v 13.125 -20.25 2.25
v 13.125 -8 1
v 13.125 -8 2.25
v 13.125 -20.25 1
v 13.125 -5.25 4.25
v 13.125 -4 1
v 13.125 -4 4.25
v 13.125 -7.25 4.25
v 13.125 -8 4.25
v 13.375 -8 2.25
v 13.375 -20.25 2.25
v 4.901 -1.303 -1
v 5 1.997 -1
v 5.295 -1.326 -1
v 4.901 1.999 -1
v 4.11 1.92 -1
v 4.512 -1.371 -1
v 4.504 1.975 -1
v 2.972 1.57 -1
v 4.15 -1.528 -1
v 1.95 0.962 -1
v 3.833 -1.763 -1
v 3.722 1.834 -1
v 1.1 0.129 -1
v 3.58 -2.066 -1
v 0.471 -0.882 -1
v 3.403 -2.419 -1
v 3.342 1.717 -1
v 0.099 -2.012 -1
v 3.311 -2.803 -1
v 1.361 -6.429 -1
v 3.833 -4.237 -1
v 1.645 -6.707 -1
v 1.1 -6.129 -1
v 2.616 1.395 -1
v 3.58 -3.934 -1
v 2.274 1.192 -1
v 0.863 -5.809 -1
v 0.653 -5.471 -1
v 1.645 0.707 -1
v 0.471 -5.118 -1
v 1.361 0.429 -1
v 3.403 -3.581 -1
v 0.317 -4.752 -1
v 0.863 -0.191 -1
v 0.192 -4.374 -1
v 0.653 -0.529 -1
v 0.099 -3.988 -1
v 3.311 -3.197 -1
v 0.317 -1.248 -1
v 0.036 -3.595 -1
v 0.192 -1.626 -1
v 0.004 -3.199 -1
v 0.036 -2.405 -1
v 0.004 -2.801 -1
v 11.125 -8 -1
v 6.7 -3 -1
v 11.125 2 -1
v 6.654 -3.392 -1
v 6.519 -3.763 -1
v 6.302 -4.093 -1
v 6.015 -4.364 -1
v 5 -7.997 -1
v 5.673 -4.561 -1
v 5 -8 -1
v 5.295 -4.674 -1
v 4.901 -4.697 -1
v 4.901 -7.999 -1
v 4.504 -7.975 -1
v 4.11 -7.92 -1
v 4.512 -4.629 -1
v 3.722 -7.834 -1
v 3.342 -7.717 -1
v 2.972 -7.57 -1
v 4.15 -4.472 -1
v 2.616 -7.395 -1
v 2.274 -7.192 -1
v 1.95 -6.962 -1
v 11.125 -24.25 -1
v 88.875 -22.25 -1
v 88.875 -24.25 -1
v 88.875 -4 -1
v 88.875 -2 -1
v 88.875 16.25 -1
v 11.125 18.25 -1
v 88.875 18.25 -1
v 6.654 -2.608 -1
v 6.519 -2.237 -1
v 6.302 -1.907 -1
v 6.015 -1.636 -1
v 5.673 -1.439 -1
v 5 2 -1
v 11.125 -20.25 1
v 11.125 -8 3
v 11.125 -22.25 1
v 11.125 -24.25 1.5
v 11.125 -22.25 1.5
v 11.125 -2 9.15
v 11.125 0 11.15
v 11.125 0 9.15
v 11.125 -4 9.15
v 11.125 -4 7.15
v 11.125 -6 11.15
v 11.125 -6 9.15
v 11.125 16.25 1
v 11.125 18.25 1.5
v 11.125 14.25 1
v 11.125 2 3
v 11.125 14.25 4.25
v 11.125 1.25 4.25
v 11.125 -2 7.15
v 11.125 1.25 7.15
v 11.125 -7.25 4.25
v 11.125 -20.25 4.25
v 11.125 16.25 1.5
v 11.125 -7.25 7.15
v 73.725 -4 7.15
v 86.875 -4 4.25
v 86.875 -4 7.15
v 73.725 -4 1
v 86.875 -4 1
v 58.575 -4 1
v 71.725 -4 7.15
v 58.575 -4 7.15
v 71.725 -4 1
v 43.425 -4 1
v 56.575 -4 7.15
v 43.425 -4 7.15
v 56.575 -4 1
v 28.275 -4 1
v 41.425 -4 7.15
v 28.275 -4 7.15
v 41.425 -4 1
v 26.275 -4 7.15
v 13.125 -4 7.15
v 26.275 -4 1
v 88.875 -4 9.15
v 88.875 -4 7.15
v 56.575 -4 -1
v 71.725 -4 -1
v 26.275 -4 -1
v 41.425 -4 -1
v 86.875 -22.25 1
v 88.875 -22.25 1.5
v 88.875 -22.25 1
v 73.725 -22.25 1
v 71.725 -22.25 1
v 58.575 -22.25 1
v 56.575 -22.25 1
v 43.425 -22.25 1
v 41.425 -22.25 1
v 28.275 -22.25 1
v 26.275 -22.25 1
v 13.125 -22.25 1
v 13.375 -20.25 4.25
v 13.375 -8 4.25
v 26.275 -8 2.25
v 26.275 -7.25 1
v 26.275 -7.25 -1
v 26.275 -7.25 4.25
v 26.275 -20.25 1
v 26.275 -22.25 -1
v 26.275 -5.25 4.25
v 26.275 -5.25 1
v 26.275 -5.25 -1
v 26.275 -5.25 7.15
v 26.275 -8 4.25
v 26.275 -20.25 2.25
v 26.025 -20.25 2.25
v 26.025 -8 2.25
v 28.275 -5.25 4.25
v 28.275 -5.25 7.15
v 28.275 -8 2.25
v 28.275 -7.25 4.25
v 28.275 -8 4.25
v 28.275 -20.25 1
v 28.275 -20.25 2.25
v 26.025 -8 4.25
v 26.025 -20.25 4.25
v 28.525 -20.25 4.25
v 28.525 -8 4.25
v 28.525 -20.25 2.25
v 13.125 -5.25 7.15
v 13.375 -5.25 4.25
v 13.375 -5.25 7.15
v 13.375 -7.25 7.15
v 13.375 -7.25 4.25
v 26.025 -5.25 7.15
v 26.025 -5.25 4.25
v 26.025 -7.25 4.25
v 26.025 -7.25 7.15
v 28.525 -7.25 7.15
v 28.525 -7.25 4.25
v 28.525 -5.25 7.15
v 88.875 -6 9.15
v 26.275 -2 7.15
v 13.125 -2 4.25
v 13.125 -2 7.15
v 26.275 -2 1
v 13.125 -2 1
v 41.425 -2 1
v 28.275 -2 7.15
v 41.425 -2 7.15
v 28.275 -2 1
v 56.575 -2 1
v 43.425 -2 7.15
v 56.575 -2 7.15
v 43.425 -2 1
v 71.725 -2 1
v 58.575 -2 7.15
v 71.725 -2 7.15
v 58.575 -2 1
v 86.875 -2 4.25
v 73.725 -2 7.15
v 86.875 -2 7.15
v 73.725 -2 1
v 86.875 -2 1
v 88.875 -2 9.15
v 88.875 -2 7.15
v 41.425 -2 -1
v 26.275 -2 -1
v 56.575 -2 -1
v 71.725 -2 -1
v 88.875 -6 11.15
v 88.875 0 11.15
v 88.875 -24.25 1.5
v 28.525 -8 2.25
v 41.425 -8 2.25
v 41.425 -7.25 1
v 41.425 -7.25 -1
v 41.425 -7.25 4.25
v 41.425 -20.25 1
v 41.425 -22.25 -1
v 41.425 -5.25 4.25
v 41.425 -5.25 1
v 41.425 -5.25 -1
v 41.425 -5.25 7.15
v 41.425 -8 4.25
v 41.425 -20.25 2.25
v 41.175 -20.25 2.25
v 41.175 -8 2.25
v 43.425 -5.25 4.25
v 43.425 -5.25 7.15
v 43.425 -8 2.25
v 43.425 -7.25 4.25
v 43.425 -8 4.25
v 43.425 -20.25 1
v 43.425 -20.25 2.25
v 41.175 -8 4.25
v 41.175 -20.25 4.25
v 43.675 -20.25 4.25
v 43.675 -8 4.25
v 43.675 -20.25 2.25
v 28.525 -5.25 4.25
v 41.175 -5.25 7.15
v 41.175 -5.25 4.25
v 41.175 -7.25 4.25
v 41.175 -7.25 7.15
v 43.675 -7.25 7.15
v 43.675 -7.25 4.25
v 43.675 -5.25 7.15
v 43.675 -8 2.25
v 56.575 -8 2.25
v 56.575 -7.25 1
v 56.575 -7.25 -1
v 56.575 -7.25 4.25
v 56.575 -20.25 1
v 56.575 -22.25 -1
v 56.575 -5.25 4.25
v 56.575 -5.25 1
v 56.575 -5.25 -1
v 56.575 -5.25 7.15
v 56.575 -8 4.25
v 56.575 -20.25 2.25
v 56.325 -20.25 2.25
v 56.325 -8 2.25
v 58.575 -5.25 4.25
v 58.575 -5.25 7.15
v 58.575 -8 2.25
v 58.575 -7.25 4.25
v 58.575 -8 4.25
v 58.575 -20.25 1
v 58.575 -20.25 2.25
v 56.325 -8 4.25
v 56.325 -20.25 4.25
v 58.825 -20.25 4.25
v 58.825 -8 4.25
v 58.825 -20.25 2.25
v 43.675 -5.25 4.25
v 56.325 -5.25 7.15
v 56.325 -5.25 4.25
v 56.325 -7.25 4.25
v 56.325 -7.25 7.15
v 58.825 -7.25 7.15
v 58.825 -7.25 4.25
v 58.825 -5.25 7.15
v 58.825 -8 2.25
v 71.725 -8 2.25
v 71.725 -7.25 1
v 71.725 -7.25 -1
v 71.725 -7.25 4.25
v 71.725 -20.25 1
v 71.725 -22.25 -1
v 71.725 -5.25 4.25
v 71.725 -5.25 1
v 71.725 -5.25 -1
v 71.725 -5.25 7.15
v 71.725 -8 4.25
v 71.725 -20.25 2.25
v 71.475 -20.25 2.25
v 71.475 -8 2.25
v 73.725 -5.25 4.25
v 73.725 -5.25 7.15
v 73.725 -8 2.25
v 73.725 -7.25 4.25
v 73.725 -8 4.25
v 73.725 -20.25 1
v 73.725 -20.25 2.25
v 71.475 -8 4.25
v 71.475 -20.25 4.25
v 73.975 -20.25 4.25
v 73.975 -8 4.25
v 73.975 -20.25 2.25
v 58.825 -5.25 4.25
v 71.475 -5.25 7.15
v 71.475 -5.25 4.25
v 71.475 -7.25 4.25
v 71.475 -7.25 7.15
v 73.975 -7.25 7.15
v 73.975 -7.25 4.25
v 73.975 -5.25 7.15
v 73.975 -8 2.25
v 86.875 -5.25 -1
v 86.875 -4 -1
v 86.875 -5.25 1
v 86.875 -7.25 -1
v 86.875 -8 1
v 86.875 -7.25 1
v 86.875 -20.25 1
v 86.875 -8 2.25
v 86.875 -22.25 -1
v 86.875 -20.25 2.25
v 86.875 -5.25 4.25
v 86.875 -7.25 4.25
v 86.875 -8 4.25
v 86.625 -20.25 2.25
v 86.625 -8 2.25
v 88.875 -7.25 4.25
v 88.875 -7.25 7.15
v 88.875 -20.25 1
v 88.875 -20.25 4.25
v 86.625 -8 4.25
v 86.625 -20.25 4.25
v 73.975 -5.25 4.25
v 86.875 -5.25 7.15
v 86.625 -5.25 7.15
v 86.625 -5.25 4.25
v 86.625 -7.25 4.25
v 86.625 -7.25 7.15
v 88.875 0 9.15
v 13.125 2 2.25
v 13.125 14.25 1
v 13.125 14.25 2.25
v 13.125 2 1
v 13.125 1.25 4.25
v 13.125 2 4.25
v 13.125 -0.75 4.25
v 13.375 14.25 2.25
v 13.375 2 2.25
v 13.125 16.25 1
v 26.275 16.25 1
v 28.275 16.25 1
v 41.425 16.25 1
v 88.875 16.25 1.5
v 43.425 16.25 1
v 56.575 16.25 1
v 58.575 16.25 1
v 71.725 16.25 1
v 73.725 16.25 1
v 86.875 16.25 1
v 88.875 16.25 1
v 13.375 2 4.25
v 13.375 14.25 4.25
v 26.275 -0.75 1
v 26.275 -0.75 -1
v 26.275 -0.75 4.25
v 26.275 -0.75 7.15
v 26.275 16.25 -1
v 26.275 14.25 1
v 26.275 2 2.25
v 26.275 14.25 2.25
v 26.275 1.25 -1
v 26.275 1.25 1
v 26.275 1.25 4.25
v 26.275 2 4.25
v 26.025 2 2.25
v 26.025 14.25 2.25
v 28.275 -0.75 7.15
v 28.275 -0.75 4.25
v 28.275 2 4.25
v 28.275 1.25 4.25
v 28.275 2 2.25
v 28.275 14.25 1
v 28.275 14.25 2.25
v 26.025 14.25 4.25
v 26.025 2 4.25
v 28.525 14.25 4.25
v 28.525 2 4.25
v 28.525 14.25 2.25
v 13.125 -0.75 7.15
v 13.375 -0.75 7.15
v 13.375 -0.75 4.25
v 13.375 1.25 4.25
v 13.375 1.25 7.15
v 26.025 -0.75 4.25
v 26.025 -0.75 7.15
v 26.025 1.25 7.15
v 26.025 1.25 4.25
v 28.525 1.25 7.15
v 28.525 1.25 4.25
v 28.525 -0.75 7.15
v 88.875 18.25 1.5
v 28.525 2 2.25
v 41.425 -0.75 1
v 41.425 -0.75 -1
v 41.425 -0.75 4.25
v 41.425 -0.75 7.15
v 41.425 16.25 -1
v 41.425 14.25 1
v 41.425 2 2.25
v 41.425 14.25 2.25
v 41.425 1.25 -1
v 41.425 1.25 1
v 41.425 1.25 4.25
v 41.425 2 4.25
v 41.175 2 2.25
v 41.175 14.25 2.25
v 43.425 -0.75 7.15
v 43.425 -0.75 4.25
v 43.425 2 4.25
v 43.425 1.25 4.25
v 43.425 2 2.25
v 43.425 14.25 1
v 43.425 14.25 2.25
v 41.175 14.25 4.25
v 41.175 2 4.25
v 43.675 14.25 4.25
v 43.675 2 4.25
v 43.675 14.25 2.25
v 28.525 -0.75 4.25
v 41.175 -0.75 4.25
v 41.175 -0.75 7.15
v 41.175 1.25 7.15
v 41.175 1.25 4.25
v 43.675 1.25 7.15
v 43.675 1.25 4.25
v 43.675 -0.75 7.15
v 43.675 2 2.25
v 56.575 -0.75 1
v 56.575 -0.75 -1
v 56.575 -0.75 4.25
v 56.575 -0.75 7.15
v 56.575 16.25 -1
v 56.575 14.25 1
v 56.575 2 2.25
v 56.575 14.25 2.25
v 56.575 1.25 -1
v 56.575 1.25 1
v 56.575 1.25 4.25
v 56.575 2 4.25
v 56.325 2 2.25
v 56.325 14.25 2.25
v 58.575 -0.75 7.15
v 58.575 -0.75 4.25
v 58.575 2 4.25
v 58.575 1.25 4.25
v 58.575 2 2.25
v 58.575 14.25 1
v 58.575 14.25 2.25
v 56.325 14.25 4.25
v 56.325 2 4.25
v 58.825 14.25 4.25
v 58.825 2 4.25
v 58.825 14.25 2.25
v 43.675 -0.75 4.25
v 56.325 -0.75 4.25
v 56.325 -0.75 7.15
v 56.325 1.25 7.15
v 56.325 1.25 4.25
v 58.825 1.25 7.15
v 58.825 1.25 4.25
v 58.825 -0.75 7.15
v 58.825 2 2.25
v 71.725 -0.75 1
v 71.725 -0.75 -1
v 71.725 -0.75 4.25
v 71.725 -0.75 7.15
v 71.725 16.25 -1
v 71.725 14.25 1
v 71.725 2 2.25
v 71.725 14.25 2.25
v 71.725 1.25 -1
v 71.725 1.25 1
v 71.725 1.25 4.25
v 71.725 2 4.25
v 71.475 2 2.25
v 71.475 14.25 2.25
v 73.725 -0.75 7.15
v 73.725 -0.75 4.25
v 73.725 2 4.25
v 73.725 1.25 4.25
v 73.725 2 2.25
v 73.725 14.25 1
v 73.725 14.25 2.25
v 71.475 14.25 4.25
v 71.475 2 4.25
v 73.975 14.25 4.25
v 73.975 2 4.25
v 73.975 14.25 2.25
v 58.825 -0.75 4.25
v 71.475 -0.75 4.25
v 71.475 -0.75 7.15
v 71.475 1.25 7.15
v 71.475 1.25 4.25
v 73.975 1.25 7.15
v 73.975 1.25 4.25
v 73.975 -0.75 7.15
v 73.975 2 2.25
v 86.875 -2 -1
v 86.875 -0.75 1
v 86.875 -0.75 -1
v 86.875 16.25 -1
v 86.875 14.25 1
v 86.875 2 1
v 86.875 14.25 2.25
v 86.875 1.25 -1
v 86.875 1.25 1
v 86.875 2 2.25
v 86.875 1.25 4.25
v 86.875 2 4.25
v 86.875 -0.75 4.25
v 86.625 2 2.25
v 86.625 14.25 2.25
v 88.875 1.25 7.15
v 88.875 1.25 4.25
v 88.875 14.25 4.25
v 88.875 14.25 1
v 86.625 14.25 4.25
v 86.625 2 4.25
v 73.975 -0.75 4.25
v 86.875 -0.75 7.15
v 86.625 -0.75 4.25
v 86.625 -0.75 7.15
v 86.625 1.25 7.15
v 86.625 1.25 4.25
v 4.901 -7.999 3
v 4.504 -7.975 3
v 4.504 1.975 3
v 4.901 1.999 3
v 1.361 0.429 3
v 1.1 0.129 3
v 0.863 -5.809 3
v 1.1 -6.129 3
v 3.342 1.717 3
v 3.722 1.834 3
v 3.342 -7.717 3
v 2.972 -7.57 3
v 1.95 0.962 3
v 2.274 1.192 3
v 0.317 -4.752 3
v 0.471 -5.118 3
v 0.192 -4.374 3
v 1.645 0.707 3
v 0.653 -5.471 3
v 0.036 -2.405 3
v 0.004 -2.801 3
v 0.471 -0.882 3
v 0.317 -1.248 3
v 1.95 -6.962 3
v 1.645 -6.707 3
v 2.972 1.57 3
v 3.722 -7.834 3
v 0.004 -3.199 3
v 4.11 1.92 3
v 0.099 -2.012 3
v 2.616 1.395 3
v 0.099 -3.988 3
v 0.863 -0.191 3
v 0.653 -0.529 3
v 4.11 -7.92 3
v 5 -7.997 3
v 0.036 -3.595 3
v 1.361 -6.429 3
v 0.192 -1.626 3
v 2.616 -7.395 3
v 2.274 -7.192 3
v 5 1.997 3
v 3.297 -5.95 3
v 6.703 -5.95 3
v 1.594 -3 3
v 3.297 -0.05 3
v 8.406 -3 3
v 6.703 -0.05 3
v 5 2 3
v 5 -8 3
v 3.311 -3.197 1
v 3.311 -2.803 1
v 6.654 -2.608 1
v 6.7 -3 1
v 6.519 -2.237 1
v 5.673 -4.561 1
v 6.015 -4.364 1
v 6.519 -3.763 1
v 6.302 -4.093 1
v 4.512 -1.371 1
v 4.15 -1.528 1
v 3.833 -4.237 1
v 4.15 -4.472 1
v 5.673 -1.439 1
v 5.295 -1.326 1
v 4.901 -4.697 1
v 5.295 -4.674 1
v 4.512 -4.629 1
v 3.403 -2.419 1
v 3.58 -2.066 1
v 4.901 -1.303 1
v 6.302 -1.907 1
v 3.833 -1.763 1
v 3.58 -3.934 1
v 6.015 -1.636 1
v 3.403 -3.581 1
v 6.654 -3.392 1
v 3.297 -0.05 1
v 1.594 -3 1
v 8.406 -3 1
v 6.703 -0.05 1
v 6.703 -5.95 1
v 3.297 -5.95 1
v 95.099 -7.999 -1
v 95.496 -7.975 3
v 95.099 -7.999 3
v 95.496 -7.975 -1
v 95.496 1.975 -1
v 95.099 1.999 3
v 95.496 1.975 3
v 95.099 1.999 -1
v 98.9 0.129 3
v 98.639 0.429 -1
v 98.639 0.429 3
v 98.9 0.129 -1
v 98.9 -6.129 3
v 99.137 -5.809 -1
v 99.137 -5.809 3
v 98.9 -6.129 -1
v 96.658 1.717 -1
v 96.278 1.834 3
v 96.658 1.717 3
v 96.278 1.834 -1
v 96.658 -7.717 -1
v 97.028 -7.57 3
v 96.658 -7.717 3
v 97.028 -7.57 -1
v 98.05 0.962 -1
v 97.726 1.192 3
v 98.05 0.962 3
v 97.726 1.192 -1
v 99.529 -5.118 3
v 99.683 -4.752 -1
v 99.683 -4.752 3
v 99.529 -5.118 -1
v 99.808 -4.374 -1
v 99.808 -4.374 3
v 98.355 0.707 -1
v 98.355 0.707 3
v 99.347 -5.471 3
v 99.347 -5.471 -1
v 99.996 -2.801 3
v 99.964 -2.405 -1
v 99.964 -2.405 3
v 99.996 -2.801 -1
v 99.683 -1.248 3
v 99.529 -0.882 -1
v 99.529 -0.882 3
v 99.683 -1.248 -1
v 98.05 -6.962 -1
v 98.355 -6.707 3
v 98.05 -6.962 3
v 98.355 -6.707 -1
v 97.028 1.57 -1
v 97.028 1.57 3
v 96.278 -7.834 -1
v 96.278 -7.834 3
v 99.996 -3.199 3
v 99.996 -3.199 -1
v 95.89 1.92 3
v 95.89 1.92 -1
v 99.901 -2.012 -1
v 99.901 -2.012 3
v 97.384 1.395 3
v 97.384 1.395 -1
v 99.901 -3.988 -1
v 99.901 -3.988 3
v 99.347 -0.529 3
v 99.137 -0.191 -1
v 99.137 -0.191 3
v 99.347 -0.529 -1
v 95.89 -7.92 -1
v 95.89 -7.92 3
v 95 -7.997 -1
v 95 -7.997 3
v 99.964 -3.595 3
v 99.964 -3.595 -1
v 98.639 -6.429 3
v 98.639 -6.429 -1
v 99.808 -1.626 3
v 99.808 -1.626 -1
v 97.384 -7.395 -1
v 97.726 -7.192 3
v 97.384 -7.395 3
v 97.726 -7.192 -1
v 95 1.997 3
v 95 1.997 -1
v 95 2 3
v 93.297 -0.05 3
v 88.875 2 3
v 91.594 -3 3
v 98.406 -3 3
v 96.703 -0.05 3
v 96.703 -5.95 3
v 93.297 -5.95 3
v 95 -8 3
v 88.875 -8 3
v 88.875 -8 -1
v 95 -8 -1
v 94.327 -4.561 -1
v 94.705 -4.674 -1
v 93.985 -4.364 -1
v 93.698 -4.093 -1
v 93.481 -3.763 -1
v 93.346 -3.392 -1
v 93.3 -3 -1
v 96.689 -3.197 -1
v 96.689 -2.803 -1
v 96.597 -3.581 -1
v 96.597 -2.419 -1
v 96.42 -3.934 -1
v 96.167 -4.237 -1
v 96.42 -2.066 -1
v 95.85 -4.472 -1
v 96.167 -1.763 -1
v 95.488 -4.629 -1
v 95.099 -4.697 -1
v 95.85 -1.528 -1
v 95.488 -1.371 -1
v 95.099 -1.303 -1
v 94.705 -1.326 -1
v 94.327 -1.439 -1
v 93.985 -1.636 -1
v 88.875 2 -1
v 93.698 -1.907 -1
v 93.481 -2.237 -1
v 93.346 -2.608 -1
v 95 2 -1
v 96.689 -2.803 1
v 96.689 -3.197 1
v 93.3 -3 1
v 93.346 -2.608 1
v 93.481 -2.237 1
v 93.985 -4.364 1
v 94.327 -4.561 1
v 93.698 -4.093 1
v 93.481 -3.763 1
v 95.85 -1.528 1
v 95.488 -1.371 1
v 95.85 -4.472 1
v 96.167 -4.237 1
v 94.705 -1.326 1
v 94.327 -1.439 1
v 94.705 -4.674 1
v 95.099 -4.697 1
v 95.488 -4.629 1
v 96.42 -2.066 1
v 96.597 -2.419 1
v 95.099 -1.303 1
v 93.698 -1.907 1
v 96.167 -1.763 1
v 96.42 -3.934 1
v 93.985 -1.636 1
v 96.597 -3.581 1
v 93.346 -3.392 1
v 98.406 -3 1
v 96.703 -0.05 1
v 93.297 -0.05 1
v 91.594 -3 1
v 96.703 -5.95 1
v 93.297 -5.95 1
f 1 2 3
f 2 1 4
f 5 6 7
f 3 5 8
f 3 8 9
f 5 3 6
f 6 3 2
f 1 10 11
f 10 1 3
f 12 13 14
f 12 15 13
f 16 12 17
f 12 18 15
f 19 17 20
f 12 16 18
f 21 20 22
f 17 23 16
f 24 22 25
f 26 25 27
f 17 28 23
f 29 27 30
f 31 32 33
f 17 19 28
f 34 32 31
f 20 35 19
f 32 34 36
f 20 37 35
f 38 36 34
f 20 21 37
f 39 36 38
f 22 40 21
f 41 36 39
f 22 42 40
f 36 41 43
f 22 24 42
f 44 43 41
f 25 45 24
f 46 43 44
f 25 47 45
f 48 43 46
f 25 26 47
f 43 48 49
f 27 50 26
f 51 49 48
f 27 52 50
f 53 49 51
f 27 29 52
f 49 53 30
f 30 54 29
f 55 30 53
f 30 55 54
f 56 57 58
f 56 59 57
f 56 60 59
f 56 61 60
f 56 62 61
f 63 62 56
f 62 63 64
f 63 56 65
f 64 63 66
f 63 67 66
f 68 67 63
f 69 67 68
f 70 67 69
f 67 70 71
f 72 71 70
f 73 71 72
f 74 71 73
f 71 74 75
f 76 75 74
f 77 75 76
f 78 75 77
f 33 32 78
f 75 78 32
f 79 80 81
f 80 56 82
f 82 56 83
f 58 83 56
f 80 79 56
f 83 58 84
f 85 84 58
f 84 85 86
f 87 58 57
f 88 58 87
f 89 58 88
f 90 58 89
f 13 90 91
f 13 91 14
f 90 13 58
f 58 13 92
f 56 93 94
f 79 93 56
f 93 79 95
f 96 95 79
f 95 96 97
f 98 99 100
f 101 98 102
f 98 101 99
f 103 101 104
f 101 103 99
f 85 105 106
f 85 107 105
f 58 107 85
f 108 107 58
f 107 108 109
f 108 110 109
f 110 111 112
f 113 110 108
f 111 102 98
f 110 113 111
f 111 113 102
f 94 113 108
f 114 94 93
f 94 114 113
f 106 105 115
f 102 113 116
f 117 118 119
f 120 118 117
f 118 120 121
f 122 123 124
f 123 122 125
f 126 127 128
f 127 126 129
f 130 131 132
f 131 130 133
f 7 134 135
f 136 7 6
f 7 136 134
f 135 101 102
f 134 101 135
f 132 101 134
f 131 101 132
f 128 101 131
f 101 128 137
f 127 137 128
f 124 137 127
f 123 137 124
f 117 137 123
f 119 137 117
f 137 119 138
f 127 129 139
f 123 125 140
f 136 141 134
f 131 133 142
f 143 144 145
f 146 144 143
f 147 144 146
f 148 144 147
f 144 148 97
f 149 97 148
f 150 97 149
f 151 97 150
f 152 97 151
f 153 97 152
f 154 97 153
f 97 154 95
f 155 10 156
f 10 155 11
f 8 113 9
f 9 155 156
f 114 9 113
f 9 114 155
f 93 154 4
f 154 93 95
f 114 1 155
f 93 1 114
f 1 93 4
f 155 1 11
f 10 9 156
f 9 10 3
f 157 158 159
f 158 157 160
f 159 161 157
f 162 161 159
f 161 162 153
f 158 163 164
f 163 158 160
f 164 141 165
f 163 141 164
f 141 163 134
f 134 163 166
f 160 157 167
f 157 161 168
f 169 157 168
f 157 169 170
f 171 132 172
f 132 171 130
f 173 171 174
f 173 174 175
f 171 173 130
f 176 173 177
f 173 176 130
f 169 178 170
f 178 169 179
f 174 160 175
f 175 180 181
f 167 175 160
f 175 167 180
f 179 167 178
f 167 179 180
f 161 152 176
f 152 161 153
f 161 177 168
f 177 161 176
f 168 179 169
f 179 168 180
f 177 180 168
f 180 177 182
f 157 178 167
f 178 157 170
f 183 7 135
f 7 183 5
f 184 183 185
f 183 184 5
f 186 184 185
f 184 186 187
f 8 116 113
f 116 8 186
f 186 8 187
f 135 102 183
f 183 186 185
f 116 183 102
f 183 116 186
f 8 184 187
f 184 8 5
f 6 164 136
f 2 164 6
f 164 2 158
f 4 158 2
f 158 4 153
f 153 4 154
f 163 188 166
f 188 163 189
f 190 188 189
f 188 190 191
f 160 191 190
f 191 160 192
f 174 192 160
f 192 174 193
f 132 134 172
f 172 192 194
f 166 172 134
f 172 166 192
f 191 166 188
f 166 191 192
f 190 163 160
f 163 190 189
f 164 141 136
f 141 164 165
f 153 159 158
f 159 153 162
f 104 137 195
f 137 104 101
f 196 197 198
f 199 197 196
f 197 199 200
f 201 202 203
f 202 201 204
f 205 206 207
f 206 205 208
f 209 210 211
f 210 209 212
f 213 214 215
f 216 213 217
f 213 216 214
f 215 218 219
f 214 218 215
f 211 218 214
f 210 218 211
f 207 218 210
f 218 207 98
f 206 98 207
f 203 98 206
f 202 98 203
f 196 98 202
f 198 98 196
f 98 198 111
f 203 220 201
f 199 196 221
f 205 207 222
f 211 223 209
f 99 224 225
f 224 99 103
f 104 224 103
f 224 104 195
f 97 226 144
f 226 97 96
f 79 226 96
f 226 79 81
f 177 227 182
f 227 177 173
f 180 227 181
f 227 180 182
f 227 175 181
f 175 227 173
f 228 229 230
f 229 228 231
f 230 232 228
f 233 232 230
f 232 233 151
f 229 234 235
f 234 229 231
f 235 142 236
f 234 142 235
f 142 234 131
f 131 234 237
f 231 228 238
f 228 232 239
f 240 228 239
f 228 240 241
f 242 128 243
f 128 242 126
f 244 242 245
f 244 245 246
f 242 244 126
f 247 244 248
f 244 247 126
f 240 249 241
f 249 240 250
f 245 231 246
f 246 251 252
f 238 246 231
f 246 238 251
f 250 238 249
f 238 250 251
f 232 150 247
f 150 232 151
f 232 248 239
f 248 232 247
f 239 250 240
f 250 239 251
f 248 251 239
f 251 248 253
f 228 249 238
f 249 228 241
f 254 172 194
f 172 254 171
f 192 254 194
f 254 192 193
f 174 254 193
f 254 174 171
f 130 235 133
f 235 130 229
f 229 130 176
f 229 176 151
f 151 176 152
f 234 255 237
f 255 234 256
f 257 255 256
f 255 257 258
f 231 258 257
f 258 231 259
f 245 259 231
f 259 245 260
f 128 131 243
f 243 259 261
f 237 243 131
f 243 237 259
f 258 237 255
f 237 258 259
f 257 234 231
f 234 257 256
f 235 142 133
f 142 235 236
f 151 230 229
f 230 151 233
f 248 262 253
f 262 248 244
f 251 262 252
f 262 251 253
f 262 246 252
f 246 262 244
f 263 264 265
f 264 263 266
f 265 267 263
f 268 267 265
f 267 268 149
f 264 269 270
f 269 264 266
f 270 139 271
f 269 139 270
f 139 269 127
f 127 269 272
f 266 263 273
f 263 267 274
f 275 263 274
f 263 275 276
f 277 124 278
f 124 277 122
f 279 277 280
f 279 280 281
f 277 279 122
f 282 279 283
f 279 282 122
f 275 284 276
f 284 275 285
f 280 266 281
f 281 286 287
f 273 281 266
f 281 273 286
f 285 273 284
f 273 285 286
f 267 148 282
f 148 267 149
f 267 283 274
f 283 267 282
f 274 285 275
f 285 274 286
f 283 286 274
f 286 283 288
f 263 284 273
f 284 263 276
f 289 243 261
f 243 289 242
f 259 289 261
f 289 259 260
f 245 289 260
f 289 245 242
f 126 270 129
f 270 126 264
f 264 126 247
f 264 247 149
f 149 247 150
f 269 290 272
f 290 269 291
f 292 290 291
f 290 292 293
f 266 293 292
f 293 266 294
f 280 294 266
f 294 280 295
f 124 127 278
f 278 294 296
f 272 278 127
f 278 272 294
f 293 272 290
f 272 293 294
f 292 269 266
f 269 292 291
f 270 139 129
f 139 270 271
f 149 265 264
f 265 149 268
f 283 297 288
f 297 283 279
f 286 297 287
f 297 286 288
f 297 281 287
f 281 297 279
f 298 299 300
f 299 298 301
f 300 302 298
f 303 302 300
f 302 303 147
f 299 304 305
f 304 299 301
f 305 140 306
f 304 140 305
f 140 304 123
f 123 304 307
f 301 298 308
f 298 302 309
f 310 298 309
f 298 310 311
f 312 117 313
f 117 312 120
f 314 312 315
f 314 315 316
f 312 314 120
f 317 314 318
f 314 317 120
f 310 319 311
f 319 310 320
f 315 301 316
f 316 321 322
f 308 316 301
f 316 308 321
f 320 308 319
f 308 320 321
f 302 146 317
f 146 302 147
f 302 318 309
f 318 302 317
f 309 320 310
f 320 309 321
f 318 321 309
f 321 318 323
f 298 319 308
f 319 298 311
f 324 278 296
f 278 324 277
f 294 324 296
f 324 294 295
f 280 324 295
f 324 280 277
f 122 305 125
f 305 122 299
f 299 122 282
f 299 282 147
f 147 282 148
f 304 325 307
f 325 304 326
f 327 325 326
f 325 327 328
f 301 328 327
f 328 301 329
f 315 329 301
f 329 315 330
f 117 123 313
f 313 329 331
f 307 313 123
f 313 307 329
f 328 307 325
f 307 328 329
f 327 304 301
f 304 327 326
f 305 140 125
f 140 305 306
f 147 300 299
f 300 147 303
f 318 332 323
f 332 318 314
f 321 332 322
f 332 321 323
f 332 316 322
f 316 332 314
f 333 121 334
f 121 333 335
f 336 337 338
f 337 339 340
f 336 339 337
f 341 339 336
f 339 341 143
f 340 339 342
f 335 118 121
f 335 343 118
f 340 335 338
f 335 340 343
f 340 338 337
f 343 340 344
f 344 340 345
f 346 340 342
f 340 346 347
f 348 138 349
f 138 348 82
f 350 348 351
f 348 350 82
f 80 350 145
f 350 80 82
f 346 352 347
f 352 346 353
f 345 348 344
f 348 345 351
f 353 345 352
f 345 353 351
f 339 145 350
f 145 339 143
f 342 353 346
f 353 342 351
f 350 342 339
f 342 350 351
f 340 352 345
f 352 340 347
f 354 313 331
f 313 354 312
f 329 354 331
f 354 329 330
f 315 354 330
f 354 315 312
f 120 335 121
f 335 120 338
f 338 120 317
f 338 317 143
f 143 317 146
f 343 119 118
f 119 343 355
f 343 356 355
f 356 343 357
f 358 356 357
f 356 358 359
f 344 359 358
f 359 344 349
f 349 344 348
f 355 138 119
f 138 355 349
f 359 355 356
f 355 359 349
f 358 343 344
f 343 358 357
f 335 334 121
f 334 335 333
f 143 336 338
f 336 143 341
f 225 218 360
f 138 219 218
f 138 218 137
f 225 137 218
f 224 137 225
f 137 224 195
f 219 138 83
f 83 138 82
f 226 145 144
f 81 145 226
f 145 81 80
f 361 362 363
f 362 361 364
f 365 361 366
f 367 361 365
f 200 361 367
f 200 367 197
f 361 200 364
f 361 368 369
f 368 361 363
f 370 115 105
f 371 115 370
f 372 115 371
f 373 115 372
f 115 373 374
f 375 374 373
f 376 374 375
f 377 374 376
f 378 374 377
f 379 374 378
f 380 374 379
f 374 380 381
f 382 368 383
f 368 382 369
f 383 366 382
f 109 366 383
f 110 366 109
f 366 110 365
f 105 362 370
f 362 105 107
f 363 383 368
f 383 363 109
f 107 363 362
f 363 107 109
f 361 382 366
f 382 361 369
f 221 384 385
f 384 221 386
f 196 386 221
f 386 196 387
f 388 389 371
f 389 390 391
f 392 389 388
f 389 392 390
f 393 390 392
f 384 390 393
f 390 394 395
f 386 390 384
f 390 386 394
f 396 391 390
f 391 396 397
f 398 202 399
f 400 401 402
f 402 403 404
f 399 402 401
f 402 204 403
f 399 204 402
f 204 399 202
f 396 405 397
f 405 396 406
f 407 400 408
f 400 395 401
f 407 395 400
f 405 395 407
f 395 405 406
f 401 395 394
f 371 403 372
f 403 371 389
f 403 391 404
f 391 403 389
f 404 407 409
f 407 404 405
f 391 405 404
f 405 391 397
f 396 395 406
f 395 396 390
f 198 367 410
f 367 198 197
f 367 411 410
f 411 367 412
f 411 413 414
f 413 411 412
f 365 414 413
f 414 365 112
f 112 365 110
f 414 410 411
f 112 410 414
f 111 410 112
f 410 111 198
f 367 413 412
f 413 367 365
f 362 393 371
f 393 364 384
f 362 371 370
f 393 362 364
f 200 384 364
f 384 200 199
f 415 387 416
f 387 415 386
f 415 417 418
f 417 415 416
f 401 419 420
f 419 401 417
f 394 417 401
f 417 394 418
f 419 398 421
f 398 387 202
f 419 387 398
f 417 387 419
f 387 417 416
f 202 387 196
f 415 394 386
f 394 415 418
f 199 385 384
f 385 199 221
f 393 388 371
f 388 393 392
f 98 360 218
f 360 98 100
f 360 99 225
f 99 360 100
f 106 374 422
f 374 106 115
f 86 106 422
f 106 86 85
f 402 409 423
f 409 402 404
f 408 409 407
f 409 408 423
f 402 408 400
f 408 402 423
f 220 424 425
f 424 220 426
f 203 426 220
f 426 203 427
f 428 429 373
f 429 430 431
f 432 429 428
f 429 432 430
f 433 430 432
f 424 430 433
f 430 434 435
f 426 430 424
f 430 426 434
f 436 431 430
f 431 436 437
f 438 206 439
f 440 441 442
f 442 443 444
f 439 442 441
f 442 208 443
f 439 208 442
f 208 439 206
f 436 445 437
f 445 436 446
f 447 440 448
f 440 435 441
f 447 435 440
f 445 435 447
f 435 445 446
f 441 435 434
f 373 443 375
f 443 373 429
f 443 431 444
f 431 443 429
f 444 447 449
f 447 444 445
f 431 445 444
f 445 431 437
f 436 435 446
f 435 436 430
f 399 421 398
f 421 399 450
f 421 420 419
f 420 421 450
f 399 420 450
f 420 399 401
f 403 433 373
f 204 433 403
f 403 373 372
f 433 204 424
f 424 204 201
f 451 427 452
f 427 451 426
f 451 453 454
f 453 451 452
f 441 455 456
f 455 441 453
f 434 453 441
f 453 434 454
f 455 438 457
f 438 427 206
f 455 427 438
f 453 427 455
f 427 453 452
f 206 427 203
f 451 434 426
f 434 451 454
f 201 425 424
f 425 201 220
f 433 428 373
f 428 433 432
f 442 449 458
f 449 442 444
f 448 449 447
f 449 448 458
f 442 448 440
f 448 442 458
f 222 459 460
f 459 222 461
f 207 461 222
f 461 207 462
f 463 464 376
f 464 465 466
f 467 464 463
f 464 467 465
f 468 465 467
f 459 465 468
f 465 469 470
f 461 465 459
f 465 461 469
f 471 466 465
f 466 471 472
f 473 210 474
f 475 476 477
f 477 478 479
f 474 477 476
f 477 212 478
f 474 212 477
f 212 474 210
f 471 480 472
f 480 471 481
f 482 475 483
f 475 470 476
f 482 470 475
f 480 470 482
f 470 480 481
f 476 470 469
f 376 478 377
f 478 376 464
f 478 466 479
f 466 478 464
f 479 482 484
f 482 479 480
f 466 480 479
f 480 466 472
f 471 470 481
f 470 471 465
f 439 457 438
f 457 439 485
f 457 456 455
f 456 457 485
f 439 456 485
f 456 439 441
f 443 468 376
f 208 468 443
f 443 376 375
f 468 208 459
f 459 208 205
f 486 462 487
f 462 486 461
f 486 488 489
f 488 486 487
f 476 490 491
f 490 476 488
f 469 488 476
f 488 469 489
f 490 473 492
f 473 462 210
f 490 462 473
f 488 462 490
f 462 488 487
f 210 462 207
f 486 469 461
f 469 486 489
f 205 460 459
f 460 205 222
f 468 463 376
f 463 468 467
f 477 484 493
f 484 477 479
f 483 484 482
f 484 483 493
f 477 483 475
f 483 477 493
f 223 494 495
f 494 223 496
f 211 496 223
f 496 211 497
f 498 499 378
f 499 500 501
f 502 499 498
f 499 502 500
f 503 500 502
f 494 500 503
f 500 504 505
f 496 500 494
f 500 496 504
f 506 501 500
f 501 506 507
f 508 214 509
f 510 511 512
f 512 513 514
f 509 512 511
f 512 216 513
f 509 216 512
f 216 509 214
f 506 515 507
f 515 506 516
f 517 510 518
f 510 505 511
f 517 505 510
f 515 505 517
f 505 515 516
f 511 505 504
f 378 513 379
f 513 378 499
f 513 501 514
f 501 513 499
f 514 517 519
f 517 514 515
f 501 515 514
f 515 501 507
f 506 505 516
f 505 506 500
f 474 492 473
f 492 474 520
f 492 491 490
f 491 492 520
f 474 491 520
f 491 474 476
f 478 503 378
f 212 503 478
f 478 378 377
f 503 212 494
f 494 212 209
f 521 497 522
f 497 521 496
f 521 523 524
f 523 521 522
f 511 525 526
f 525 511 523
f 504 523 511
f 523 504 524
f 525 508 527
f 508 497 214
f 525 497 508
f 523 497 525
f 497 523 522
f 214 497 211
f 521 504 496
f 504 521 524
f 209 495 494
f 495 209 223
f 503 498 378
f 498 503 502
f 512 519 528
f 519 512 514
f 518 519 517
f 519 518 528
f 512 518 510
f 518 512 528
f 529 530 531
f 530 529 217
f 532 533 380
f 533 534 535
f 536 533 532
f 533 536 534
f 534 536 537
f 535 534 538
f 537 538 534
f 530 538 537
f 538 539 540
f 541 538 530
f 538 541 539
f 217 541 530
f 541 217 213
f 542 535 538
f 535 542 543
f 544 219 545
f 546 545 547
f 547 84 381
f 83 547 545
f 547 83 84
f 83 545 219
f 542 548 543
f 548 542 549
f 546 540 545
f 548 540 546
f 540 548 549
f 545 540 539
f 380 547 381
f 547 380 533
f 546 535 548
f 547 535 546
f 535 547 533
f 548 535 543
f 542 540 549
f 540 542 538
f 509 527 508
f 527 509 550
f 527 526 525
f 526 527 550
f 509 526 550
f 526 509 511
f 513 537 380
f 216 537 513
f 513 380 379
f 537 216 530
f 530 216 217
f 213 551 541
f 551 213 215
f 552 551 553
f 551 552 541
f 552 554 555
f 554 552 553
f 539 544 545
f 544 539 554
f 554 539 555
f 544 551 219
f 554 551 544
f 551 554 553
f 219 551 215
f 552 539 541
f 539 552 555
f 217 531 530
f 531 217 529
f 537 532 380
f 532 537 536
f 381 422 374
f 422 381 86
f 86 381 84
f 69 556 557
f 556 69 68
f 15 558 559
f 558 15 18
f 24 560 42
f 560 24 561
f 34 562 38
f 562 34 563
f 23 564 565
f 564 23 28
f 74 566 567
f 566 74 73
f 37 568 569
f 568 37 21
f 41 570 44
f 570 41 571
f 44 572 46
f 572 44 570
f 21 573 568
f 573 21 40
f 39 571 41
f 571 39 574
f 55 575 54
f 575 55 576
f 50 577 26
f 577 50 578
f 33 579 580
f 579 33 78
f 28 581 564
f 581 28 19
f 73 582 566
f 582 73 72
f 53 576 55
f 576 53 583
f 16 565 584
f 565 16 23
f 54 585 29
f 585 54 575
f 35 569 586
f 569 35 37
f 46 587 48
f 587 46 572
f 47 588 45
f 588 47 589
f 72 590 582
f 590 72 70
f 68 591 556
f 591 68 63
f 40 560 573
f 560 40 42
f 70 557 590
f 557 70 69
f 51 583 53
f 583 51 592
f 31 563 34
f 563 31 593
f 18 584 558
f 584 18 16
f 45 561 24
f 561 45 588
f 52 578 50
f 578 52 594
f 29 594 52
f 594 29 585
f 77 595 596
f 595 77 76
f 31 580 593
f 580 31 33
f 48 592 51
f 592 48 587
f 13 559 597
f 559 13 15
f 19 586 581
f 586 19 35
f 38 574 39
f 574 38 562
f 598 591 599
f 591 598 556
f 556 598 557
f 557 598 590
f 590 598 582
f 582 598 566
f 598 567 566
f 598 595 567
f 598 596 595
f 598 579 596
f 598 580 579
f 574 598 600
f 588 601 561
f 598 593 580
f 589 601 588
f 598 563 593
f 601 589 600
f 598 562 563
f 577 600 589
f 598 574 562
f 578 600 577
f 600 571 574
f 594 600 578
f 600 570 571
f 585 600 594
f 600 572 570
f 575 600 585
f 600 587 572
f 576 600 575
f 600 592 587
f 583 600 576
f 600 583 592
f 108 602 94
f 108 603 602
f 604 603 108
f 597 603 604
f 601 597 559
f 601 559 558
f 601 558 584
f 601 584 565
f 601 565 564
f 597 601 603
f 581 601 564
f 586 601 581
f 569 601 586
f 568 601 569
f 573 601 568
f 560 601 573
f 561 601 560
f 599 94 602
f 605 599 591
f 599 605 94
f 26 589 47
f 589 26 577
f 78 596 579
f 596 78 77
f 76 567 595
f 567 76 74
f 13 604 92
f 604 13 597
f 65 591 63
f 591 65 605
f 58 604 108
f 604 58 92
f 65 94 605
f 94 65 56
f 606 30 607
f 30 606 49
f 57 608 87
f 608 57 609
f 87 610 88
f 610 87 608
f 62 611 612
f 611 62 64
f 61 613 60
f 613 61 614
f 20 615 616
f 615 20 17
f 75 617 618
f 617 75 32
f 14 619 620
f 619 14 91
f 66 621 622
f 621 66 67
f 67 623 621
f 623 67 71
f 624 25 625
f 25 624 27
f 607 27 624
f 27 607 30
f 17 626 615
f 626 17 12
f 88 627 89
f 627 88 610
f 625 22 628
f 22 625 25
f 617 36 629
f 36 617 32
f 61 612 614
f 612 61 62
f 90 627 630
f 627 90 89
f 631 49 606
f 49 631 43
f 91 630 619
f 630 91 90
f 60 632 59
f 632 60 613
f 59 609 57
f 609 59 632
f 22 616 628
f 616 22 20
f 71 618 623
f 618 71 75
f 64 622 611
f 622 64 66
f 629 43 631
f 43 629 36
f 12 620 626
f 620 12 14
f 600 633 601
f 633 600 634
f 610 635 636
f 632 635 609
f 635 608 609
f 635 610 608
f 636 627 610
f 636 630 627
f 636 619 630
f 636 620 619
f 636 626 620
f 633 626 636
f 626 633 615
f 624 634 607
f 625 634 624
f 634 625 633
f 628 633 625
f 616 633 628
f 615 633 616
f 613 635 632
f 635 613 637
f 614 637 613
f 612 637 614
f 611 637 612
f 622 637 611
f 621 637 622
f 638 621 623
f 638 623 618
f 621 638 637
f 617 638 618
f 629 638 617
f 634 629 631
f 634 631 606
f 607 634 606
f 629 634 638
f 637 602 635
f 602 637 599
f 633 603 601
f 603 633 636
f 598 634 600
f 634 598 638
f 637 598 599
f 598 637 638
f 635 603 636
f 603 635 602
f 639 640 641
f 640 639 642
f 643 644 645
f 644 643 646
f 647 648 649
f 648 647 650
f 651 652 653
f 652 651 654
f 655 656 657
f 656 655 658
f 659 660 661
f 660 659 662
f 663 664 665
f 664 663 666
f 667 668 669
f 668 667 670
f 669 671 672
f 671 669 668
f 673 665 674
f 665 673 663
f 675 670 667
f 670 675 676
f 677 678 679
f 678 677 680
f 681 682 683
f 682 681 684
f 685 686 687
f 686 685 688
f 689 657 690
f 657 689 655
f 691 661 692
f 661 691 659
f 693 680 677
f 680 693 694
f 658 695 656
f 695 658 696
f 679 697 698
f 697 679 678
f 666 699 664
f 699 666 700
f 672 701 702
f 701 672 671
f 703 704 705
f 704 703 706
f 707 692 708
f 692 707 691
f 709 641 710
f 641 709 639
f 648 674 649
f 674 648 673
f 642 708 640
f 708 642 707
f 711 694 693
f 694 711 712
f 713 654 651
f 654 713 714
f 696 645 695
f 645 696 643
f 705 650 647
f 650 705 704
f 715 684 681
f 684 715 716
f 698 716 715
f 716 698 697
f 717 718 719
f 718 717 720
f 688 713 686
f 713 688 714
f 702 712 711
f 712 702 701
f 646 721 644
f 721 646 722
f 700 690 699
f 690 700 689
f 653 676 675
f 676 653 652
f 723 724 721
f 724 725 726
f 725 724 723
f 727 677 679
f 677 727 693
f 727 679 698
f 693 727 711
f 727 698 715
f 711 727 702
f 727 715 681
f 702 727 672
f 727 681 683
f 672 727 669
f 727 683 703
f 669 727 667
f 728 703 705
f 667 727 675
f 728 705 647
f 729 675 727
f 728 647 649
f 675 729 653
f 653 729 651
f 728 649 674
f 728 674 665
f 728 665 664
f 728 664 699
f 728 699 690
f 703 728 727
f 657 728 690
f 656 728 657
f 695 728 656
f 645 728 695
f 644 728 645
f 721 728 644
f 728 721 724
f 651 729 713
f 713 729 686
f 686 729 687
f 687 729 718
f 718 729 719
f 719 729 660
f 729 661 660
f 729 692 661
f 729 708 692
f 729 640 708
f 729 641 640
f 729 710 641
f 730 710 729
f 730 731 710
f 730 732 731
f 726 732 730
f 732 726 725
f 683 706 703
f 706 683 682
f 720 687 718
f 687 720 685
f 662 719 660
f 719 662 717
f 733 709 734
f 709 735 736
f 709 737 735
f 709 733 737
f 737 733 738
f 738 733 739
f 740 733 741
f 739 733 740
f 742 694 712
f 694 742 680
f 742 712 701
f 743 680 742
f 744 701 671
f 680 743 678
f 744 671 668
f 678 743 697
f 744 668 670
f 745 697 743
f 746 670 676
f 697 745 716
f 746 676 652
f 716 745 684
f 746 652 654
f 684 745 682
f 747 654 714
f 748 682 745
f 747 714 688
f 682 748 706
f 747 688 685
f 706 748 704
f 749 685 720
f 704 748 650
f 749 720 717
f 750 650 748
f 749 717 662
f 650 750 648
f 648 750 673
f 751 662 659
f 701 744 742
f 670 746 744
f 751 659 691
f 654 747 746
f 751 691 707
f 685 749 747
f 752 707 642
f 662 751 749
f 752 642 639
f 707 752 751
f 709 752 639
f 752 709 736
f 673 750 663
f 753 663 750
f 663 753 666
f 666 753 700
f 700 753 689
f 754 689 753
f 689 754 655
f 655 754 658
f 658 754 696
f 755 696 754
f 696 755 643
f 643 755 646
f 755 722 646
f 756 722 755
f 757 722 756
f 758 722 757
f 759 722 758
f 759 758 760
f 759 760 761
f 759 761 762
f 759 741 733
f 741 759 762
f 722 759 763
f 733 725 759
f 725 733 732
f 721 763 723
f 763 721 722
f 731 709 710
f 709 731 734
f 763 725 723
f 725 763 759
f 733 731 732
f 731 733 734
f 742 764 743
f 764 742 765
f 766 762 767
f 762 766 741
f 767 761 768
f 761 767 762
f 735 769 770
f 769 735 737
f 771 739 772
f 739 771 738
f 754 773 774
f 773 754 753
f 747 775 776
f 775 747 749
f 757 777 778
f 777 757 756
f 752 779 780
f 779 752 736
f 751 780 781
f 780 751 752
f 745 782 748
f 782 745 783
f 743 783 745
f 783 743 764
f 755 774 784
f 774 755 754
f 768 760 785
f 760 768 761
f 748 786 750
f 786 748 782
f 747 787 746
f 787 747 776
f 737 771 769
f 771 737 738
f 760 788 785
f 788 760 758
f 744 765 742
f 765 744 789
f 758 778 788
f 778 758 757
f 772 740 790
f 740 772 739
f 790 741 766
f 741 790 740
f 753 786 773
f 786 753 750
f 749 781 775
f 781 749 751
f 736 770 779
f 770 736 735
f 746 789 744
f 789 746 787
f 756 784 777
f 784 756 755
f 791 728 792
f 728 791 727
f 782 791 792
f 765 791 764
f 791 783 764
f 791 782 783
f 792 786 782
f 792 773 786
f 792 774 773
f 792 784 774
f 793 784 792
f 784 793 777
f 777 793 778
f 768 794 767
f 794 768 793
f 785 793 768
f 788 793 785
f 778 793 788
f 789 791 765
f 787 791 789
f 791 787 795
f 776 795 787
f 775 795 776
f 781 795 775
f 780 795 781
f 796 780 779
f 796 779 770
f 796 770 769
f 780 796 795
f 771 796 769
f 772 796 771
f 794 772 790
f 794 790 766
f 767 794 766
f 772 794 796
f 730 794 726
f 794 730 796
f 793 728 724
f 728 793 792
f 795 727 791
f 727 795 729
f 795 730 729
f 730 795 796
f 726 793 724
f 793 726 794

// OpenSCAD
// ////////////////////////////////////////////////
//
// WAGO 221 mount
//
// Creates a single row or double row set of 221 blocks
// with mounting tabs/ears at either end.
//
// Created - 2017/01/01 by Joo Chung
// Modified - 2023/03/15 by Matlek
// Modifications added :
// - adapting distance for the tab holes;
// - nut sockets
//
// ////////////////////////////////////////////////

// ////////////////////////////////////////////////
// vector of blocks. each element specifies the number of conductors for that block
// EDIT THIS
blocks = [2,2,2,2,2]; // a single 5 conductor blocks 
// blocks = [5, 3, 2]; // a set of 5 conductor, 3 conductor, 2 conductor blocks
// blocks = [5, 5, 5]; // a set of three 5 conductor blocks
// blocks = [2]; // a single 2 conductor block
// blocks = [3]; // a single 3 conductor block


// ////////////////////////////////////////////////
// Mirror the mount, stand it up, and put tabs on bottom.
// 0 - no mirror, 1 - mirror, rotate so its standing up, and reposition tabs
// 2 - mirror, rotate so that they are laying flat, and reposition tabs.
// EDIT THIS
mirror = 2;

// ////////////////////////////////////////////////
// Tabs - include or exclude mounting tabs
// EDIT THIS: 0 - no tabs, 1 - tabs
tabs = 1;
// EDIT THIS: radius of hole in tab
tabradius = 1.7;
// EDIT THIS: thickness of tab
tabheight = 4;
// EDIT THIS: Set width and length of the tab. (tab is basically a square)
tabwidth = 10;
// EDIT : minimal distance between 2 holes on modular prototyping board
mindist = 10;
//EDIT : 
nutwidth = 5.9;

// ////////////////////////////////////////////////
// Block dimensions in mm -- DO NOT EDIT
conwidth = 5.6; // width of a single conductor
// DO NOT EDIT
border = 1.75; // block transparent plastic border
// DO NOT EDIT
blockdepth = 18.25;
// DO NOT EDIT
fudge = 0.2;

// ////////////////////////////////////////////////
// OpenSCAD special variables -- DO NOT EDIT
$fa = 1;
// DO NOT EDIT
$fs = 0.4;

// ////////////////////////////////////////////////
// Functions
function bw(x) = conwidth*x+border+fudge; // block width
function mw(i, n) = ( i==0 ? bw(blocks[i]) + 2 + mw(i+1, n) : (i < n ? bw(blocks[i]) + 2 + mw(i+1, n) : 0)); // mount width (index, max index)


// ////////////////////////////////////////////////
// Modules
module tab(width, hole, thickness, taboffset) {
    difference() {
        union () {
            cylinder(thickness,width/2,width/2, true);
            translate([taboffset/2,0,0]) cube([taboffset,width,thickness], true);
        }
    cylinder(width,hole,hole, true);
    translate([0, 0, tabheight/2])
    linear_extrude(height=tabheight, center=true)
    circle(r=nutwidth/sqrt(3), $fn=6);
    }
}



module shoulder (depth) {
    difference () {
        union () {
            cube([2, blockdepth, 3.25], false);
            translate([0,0,3.25]) cube([2.25, blockdepth, 2], false);
        }
        translate([0,0,2]) cube([2.25,2,3.25], false);
        translate([2,blockdepth-4,2]) cube([0.25,4,3.25], false);
    }
}


module backshoulder (height) {
    difference() {
        union() {  
            translate([0, 2, 0]) cube ([2, 1.25, 10.15]);
            cube ([2.25, 2, 10.15]);
        }
        translate([0,0,10.15-2]) cube([2.25,3.25,2]);
        translate([2,0,2]) cube([1.25,3.25,3.25]);
    }
}



// WAGO 221 block
module block (nconn) {
    blockwidth = bw(nconn);

    // base
    translate([2,2,0]) cube([blockwidth, blockdepth, 2], false);
    
    // back headboard
    translate([0,blockdepth+2,0]) cube([blockwidth+4, 2, 10.15], false);

    // back lip
    translate([0,blockdepth,10.15]) cube([blockwidth+4, 4, 2], false);
    
    // front lip
    translate([0,0,0]) cube([blockwidth+4, 2, 2.5], false);

    // left shoulder and right shoulders
    translate([0,2,0]) shoulder();
    translate([blockwidth+4,2,0]) mirror() shoulder(); 
    
    // back left and shoulder
    translate([0, blockdepth-1.25, 0]) backshoulder(); 
    translate([blockwidth+4, blockdepth -1.25, 0]) mirror() backshoulder();
    
}



// ////////////////////////////////////////////////
// MAIN BODY

mountwidth=mw(0, len(blocks));
holesdist=mw(0, len(blocks))+2+tabwidth;
holesdistcorrected=holesdist - (holesdist % mindist) + mindist;
taboffset = (holesdistcorrected - (mountwidth+2))/2;
if (mirror==0) { // No mirror. Single row of blocks
    // create array of blocks
    for (i=[0:len(blocks)-1]) {
        offset = (i==0) ? tabwidth/2+taboffset : tabwidth/2+taboffset + mw(0, i);
        translate([offset, 0, 0]) block(blocks[i]);
    }
    
    // left and right tabs
    if (tabs==1) {
        translate([tabwidth/2,(blockdepth+4)/2,tabheight/2]) tab (tabwidth, tabradius, tabheight, taboffset);
        translate([mountwidth+2+tabwidth/2+taboffset*2,(blockdepth+4)/2,tabheight/2]) mirror() tab (tabwidth, tabradius, tabheight, taboffset);
    }
} else if (mirror==1) { // Mirrored. two rows of blocks, back to back.
    // Row #1. Stand up on headboard.
    rotate([-90,0,0]) for (i=[0:len(blocks)-1]) {
        offset = (i==0) ? tabwidth/2+taboffset : tabwidth/2+taboffset + mw(0, i);
        translate([offset, 0, -1]) block(blocks[i]);
    }
    
    // Row #2. Opposite rotation. Stand up on headbord
    rotate([90,0,0]) mirror ([0, 1, 0]) for (i=[0:len(blocks)-1]) {
        offset = (i==0) ? tabwidth/2+taboffset : tabwidth/2+taboffset + mw(0, i);
        translate([offset, 0, -1]) block(blocks[i]);
    }   
    
    // left and right tabs
    if (tabs==1) {
        translate([tabwidth/2,0,-blockdepth-tabheight/2]) tab (tabwidth, tabradius, tabheight, taboffset);
        translate([mountwidth+2+tabwidth/2+taboffset*2,0,-blockdepth-tabheight/2]) mirror() tab (tabwidth, tabradius, tabheight, taboffset);
    }
} else if (mirror==2) {
    // Row #1. 
    for (i=[0:len(blocks)-1]) {
        offset = (i==0) ? tabwidth/2+taboffset : tabwidth/2+taboffset + mw(0, i);
        translate([offset, -blockdepth-6, -1]) block(blocks[i]);
    }
    
    // Row #2. Flip
    mirror ([0, 1, 0]) for (i=[0:len(blocks)-1]) {
        offset = (i==0) ? tabwidth/2+taboffset : tabwidth/2+taboffset + mw(0, i);
        translate([offset, -blockdepth, -1]) block(blocks[i]);
    }   
    
    // left and right tabs
    if (tabs==1) {
        translate([tabwidth/2,-3,(tabheight-2)/2]) tab (tabwidth, tabradius, tabheight, taboffset);
        translate([mountwidth+2+tabwidth/2+taboffset*2,-3,(tabheight-2)/2]) mirror() tab (tabwidth, tabradius, tabheight, taboffset);
    }
}
